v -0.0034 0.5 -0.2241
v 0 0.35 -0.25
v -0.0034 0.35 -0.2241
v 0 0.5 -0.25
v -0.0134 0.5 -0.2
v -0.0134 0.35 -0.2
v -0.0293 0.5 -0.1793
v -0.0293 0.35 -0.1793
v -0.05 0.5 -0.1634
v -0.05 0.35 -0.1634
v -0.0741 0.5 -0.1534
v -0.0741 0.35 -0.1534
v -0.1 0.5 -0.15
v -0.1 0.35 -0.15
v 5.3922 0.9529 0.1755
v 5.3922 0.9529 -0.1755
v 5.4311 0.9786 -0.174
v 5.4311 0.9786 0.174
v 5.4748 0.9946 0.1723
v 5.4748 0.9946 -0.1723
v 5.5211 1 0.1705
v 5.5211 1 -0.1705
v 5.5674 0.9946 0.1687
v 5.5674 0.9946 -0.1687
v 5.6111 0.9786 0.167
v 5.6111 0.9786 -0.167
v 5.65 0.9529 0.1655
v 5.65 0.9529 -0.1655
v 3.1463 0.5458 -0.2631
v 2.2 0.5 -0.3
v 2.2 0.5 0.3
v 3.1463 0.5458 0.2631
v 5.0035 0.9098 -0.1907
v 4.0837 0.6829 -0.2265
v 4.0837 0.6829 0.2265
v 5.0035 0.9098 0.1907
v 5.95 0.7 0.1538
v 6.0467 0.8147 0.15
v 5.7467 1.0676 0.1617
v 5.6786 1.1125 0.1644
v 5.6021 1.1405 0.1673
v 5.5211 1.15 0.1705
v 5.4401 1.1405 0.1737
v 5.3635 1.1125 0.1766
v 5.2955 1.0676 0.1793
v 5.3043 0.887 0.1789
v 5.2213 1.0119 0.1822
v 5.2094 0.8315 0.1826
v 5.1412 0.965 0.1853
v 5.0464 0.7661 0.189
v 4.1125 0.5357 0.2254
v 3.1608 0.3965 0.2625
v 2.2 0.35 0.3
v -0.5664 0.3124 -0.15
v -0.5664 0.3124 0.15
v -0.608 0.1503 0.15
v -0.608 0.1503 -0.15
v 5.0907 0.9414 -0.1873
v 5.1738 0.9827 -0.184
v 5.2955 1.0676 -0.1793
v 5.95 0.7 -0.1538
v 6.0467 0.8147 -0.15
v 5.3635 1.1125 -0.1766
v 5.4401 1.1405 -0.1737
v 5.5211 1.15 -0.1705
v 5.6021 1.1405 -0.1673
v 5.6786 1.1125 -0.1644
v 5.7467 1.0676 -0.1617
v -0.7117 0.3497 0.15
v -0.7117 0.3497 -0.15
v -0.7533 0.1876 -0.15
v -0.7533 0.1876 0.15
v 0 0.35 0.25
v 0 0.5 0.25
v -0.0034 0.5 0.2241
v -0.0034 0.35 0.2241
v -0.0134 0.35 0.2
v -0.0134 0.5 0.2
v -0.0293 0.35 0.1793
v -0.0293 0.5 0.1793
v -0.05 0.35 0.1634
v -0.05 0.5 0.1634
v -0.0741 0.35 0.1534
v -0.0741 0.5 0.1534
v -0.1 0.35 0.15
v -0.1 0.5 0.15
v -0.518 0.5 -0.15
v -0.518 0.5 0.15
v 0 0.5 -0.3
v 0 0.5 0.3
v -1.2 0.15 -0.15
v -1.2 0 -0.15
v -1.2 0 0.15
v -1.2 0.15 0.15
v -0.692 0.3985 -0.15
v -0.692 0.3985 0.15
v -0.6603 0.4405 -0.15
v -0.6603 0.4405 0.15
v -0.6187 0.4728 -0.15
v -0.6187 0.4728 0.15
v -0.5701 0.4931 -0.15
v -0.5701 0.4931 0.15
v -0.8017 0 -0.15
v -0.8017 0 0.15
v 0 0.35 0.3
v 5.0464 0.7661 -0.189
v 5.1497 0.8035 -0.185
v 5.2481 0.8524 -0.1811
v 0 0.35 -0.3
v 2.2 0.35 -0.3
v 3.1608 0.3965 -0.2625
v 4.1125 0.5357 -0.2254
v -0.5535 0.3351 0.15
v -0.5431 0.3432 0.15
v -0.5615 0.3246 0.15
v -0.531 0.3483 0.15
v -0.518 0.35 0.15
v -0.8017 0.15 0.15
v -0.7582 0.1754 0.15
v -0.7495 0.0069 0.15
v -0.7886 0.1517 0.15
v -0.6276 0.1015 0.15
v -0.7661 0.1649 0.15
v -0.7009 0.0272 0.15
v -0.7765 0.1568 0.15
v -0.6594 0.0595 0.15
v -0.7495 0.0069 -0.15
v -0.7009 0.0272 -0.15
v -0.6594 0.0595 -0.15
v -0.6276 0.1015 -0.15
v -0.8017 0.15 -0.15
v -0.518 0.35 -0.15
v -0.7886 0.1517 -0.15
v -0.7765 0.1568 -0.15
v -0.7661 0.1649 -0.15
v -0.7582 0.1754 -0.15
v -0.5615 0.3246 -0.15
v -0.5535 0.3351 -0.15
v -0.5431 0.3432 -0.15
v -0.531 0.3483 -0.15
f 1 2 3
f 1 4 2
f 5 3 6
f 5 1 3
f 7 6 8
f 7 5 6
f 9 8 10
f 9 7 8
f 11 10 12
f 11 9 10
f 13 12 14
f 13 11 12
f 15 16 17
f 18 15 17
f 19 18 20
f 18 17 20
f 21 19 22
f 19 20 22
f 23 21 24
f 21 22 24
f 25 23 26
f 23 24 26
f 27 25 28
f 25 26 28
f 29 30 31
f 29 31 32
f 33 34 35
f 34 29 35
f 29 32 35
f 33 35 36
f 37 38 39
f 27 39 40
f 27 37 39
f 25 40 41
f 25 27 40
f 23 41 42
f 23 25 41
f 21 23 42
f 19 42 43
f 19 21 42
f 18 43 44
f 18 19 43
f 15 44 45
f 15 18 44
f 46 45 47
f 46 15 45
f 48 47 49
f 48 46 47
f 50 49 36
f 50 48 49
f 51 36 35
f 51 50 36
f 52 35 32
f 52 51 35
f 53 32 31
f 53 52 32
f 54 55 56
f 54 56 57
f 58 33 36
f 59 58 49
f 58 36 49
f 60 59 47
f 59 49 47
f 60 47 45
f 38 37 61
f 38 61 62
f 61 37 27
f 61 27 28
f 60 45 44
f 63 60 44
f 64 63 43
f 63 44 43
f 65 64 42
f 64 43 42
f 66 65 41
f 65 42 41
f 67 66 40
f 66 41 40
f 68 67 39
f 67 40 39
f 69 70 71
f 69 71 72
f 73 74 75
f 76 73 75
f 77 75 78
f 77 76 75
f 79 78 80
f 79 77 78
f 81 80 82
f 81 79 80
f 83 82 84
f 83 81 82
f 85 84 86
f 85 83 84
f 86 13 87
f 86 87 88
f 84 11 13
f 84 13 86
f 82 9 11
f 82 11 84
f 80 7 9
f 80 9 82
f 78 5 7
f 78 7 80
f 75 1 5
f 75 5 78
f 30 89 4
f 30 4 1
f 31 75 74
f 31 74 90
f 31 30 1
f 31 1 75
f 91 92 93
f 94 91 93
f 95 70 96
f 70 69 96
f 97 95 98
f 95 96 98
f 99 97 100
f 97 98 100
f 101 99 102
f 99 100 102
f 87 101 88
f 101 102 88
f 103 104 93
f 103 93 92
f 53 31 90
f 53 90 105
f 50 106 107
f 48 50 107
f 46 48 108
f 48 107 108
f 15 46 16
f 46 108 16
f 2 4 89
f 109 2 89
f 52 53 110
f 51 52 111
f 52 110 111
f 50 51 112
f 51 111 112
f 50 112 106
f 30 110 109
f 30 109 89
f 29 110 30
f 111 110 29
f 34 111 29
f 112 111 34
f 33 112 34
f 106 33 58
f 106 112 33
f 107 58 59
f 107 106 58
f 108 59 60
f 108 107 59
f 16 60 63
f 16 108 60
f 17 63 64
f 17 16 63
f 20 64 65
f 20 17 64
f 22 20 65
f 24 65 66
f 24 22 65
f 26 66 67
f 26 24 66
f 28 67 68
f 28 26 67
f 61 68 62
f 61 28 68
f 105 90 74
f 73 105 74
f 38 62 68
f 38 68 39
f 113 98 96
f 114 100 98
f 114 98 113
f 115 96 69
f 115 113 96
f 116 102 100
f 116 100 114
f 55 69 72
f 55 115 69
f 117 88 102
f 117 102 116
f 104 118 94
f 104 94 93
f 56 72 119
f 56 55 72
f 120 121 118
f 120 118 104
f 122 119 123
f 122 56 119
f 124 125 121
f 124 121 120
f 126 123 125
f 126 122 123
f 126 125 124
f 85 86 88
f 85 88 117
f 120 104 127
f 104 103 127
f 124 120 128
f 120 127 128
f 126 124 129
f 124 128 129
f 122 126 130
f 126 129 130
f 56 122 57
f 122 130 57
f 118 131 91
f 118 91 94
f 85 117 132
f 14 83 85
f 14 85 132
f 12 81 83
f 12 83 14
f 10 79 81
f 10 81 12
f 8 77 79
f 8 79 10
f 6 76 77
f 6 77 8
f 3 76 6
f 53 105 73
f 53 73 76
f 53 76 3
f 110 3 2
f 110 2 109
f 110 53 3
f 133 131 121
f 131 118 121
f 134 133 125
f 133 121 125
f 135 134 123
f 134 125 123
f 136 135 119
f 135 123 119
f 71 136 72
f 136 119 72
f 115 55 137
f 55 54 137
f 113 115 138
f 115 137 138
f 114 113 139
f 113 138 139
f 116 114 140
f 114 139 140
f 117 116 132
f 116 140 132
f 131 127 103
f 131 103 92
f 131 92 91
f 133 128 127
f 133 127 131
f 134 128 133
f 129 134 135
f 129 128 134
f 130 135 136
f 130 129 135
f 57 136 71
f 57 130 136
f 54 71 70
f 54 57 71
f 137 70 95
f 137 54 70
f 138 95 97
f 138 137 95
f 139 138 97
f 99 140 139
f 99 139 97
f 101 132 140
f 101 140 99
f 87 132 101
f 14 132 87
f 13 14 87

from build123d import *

# Parameters (mm, degrees)
SKETCH1_W           = 0.6
SKETCH1_H           = 0.15
BOSS_EXTRUDE1_DEPTH = 1.7
SKETCH3_W           = 0.3
SKETCH3_H           = 0.15
FILLET1_R           = 0.1
SKETCH6_W           = 0.6
SKETCH6_H           = 0.15
SKETCH8_OUTSIDE_W   = 10.719
SKETCH8_OUTSIDE_H   = 4.072
CUT_EXTRUDE2_DEPTH  = 2.15


with BuildPart() as part:
    # Sketch1 → Boss-Extrude1 (new body)
    with BuildSketch(Plane(origin=(0, 0, 0), x_dir=(0, 0, -1), z_dir=(1, 0, 0))):
        with Locations((0, 0.425)):
            Rectangle(SKETCH1_W, SKETCH1_H)
    extrude(amount=BOSS_EXTRUDE1_DEPTH)

    # Sweep1: sweep along a path in Sketch4
    with BuildLine(Plane.XY) as sweep1_path:
        Line((-1.2, 0), (-0.801686668, 0))
        ThreePointArc((-0.801686668, 0), (-0.679081123, 0.041987722), (-0.607954852, 0.150321198))
        Line((-0.607954852, 0.150321198), (-0.566387806, 0.3124197))
        ThreePointArc((-0.566387806, 0.3124197), (-0.548606238, 0.33950307), (-0.517954852, 0.35))
        Line((-0.517954852, 0.35), (0, 0.35))
    # Sketch3 → Sweep1 (sweep)
    with BuildSketch(Plane(origin=(-1.2, 0, 0), x_dir=(0, 0, -1), z_dir=(1, 0, 0))):
        with Locations((0, 0.075)):
            Rectangle(SKETCH3_W, SKETCH3_H)
    sweep(path=sweep1_path.line)

    # Fillet1
    fillet1_edges = [part.edges().sort_by_distance(p)[0] for p in [
        (0, 0.425, -0.15),
        (0, 0.425, 0.15),
    ]]
    fillet(fillet1_edges, radius=FILLET1_R)

    # Sweep2: sweep along a path in Sketch5
    with BuildLine(Plane.XY) as sweep2_path:
        Line((1.7, 0.35), (2.2, 0.35))
        ThreePointArc((2.2, 0.35), (3.63833241, 0.454572769), (5.046413219, 0.76609166))
        ThreePointArc((5.046413219, 0.76609166), (5.228907253, 0.84171313), (5.392178582, 0.952911835))
        ThreePointArc((5.392178582, 0.952911835), (5.521089291, 1), (5.65, 0.952911835))
        Line((5.65, 0.952911835), (5.95, 0.7))
    # Sketch6 → Sweep2 (sweep)
    with BuildSketch(Plane(origin=(1.7, 0, 0), x_dir=(0, 0, -1), z_dir=(1, 0, 0))):
        with Locations((0, 0.425)):
            Rectangle(SKETCH6_W, SKETCH6_H)
    sweep(path=sweep2_path.line)

    # Sketch8 outside → Cut-Extrude2 (cut, through all)
    with BuildSketch(Plane(origin=(0, 0, 0), x_dir=(1, 0, 0), z_dir=(0, 1, 0))):
        with Locations((2.4235, 0)):
            Rectangle(SKETCH8_OUTSIDE_W, SKETCH8_OUTSIDE_H)
        Polygon((-1.2, 0.432581758), (6.046683032, 0.15), (6.046683032, -0.15), (-1.2, -0.432581758), align=None, mode=Mode.SUBTRACT)
    extrude(amount=CUT_EXTRUDE2_DEPTH, mode=Mode.SUBTRACT)


solid = part.part
